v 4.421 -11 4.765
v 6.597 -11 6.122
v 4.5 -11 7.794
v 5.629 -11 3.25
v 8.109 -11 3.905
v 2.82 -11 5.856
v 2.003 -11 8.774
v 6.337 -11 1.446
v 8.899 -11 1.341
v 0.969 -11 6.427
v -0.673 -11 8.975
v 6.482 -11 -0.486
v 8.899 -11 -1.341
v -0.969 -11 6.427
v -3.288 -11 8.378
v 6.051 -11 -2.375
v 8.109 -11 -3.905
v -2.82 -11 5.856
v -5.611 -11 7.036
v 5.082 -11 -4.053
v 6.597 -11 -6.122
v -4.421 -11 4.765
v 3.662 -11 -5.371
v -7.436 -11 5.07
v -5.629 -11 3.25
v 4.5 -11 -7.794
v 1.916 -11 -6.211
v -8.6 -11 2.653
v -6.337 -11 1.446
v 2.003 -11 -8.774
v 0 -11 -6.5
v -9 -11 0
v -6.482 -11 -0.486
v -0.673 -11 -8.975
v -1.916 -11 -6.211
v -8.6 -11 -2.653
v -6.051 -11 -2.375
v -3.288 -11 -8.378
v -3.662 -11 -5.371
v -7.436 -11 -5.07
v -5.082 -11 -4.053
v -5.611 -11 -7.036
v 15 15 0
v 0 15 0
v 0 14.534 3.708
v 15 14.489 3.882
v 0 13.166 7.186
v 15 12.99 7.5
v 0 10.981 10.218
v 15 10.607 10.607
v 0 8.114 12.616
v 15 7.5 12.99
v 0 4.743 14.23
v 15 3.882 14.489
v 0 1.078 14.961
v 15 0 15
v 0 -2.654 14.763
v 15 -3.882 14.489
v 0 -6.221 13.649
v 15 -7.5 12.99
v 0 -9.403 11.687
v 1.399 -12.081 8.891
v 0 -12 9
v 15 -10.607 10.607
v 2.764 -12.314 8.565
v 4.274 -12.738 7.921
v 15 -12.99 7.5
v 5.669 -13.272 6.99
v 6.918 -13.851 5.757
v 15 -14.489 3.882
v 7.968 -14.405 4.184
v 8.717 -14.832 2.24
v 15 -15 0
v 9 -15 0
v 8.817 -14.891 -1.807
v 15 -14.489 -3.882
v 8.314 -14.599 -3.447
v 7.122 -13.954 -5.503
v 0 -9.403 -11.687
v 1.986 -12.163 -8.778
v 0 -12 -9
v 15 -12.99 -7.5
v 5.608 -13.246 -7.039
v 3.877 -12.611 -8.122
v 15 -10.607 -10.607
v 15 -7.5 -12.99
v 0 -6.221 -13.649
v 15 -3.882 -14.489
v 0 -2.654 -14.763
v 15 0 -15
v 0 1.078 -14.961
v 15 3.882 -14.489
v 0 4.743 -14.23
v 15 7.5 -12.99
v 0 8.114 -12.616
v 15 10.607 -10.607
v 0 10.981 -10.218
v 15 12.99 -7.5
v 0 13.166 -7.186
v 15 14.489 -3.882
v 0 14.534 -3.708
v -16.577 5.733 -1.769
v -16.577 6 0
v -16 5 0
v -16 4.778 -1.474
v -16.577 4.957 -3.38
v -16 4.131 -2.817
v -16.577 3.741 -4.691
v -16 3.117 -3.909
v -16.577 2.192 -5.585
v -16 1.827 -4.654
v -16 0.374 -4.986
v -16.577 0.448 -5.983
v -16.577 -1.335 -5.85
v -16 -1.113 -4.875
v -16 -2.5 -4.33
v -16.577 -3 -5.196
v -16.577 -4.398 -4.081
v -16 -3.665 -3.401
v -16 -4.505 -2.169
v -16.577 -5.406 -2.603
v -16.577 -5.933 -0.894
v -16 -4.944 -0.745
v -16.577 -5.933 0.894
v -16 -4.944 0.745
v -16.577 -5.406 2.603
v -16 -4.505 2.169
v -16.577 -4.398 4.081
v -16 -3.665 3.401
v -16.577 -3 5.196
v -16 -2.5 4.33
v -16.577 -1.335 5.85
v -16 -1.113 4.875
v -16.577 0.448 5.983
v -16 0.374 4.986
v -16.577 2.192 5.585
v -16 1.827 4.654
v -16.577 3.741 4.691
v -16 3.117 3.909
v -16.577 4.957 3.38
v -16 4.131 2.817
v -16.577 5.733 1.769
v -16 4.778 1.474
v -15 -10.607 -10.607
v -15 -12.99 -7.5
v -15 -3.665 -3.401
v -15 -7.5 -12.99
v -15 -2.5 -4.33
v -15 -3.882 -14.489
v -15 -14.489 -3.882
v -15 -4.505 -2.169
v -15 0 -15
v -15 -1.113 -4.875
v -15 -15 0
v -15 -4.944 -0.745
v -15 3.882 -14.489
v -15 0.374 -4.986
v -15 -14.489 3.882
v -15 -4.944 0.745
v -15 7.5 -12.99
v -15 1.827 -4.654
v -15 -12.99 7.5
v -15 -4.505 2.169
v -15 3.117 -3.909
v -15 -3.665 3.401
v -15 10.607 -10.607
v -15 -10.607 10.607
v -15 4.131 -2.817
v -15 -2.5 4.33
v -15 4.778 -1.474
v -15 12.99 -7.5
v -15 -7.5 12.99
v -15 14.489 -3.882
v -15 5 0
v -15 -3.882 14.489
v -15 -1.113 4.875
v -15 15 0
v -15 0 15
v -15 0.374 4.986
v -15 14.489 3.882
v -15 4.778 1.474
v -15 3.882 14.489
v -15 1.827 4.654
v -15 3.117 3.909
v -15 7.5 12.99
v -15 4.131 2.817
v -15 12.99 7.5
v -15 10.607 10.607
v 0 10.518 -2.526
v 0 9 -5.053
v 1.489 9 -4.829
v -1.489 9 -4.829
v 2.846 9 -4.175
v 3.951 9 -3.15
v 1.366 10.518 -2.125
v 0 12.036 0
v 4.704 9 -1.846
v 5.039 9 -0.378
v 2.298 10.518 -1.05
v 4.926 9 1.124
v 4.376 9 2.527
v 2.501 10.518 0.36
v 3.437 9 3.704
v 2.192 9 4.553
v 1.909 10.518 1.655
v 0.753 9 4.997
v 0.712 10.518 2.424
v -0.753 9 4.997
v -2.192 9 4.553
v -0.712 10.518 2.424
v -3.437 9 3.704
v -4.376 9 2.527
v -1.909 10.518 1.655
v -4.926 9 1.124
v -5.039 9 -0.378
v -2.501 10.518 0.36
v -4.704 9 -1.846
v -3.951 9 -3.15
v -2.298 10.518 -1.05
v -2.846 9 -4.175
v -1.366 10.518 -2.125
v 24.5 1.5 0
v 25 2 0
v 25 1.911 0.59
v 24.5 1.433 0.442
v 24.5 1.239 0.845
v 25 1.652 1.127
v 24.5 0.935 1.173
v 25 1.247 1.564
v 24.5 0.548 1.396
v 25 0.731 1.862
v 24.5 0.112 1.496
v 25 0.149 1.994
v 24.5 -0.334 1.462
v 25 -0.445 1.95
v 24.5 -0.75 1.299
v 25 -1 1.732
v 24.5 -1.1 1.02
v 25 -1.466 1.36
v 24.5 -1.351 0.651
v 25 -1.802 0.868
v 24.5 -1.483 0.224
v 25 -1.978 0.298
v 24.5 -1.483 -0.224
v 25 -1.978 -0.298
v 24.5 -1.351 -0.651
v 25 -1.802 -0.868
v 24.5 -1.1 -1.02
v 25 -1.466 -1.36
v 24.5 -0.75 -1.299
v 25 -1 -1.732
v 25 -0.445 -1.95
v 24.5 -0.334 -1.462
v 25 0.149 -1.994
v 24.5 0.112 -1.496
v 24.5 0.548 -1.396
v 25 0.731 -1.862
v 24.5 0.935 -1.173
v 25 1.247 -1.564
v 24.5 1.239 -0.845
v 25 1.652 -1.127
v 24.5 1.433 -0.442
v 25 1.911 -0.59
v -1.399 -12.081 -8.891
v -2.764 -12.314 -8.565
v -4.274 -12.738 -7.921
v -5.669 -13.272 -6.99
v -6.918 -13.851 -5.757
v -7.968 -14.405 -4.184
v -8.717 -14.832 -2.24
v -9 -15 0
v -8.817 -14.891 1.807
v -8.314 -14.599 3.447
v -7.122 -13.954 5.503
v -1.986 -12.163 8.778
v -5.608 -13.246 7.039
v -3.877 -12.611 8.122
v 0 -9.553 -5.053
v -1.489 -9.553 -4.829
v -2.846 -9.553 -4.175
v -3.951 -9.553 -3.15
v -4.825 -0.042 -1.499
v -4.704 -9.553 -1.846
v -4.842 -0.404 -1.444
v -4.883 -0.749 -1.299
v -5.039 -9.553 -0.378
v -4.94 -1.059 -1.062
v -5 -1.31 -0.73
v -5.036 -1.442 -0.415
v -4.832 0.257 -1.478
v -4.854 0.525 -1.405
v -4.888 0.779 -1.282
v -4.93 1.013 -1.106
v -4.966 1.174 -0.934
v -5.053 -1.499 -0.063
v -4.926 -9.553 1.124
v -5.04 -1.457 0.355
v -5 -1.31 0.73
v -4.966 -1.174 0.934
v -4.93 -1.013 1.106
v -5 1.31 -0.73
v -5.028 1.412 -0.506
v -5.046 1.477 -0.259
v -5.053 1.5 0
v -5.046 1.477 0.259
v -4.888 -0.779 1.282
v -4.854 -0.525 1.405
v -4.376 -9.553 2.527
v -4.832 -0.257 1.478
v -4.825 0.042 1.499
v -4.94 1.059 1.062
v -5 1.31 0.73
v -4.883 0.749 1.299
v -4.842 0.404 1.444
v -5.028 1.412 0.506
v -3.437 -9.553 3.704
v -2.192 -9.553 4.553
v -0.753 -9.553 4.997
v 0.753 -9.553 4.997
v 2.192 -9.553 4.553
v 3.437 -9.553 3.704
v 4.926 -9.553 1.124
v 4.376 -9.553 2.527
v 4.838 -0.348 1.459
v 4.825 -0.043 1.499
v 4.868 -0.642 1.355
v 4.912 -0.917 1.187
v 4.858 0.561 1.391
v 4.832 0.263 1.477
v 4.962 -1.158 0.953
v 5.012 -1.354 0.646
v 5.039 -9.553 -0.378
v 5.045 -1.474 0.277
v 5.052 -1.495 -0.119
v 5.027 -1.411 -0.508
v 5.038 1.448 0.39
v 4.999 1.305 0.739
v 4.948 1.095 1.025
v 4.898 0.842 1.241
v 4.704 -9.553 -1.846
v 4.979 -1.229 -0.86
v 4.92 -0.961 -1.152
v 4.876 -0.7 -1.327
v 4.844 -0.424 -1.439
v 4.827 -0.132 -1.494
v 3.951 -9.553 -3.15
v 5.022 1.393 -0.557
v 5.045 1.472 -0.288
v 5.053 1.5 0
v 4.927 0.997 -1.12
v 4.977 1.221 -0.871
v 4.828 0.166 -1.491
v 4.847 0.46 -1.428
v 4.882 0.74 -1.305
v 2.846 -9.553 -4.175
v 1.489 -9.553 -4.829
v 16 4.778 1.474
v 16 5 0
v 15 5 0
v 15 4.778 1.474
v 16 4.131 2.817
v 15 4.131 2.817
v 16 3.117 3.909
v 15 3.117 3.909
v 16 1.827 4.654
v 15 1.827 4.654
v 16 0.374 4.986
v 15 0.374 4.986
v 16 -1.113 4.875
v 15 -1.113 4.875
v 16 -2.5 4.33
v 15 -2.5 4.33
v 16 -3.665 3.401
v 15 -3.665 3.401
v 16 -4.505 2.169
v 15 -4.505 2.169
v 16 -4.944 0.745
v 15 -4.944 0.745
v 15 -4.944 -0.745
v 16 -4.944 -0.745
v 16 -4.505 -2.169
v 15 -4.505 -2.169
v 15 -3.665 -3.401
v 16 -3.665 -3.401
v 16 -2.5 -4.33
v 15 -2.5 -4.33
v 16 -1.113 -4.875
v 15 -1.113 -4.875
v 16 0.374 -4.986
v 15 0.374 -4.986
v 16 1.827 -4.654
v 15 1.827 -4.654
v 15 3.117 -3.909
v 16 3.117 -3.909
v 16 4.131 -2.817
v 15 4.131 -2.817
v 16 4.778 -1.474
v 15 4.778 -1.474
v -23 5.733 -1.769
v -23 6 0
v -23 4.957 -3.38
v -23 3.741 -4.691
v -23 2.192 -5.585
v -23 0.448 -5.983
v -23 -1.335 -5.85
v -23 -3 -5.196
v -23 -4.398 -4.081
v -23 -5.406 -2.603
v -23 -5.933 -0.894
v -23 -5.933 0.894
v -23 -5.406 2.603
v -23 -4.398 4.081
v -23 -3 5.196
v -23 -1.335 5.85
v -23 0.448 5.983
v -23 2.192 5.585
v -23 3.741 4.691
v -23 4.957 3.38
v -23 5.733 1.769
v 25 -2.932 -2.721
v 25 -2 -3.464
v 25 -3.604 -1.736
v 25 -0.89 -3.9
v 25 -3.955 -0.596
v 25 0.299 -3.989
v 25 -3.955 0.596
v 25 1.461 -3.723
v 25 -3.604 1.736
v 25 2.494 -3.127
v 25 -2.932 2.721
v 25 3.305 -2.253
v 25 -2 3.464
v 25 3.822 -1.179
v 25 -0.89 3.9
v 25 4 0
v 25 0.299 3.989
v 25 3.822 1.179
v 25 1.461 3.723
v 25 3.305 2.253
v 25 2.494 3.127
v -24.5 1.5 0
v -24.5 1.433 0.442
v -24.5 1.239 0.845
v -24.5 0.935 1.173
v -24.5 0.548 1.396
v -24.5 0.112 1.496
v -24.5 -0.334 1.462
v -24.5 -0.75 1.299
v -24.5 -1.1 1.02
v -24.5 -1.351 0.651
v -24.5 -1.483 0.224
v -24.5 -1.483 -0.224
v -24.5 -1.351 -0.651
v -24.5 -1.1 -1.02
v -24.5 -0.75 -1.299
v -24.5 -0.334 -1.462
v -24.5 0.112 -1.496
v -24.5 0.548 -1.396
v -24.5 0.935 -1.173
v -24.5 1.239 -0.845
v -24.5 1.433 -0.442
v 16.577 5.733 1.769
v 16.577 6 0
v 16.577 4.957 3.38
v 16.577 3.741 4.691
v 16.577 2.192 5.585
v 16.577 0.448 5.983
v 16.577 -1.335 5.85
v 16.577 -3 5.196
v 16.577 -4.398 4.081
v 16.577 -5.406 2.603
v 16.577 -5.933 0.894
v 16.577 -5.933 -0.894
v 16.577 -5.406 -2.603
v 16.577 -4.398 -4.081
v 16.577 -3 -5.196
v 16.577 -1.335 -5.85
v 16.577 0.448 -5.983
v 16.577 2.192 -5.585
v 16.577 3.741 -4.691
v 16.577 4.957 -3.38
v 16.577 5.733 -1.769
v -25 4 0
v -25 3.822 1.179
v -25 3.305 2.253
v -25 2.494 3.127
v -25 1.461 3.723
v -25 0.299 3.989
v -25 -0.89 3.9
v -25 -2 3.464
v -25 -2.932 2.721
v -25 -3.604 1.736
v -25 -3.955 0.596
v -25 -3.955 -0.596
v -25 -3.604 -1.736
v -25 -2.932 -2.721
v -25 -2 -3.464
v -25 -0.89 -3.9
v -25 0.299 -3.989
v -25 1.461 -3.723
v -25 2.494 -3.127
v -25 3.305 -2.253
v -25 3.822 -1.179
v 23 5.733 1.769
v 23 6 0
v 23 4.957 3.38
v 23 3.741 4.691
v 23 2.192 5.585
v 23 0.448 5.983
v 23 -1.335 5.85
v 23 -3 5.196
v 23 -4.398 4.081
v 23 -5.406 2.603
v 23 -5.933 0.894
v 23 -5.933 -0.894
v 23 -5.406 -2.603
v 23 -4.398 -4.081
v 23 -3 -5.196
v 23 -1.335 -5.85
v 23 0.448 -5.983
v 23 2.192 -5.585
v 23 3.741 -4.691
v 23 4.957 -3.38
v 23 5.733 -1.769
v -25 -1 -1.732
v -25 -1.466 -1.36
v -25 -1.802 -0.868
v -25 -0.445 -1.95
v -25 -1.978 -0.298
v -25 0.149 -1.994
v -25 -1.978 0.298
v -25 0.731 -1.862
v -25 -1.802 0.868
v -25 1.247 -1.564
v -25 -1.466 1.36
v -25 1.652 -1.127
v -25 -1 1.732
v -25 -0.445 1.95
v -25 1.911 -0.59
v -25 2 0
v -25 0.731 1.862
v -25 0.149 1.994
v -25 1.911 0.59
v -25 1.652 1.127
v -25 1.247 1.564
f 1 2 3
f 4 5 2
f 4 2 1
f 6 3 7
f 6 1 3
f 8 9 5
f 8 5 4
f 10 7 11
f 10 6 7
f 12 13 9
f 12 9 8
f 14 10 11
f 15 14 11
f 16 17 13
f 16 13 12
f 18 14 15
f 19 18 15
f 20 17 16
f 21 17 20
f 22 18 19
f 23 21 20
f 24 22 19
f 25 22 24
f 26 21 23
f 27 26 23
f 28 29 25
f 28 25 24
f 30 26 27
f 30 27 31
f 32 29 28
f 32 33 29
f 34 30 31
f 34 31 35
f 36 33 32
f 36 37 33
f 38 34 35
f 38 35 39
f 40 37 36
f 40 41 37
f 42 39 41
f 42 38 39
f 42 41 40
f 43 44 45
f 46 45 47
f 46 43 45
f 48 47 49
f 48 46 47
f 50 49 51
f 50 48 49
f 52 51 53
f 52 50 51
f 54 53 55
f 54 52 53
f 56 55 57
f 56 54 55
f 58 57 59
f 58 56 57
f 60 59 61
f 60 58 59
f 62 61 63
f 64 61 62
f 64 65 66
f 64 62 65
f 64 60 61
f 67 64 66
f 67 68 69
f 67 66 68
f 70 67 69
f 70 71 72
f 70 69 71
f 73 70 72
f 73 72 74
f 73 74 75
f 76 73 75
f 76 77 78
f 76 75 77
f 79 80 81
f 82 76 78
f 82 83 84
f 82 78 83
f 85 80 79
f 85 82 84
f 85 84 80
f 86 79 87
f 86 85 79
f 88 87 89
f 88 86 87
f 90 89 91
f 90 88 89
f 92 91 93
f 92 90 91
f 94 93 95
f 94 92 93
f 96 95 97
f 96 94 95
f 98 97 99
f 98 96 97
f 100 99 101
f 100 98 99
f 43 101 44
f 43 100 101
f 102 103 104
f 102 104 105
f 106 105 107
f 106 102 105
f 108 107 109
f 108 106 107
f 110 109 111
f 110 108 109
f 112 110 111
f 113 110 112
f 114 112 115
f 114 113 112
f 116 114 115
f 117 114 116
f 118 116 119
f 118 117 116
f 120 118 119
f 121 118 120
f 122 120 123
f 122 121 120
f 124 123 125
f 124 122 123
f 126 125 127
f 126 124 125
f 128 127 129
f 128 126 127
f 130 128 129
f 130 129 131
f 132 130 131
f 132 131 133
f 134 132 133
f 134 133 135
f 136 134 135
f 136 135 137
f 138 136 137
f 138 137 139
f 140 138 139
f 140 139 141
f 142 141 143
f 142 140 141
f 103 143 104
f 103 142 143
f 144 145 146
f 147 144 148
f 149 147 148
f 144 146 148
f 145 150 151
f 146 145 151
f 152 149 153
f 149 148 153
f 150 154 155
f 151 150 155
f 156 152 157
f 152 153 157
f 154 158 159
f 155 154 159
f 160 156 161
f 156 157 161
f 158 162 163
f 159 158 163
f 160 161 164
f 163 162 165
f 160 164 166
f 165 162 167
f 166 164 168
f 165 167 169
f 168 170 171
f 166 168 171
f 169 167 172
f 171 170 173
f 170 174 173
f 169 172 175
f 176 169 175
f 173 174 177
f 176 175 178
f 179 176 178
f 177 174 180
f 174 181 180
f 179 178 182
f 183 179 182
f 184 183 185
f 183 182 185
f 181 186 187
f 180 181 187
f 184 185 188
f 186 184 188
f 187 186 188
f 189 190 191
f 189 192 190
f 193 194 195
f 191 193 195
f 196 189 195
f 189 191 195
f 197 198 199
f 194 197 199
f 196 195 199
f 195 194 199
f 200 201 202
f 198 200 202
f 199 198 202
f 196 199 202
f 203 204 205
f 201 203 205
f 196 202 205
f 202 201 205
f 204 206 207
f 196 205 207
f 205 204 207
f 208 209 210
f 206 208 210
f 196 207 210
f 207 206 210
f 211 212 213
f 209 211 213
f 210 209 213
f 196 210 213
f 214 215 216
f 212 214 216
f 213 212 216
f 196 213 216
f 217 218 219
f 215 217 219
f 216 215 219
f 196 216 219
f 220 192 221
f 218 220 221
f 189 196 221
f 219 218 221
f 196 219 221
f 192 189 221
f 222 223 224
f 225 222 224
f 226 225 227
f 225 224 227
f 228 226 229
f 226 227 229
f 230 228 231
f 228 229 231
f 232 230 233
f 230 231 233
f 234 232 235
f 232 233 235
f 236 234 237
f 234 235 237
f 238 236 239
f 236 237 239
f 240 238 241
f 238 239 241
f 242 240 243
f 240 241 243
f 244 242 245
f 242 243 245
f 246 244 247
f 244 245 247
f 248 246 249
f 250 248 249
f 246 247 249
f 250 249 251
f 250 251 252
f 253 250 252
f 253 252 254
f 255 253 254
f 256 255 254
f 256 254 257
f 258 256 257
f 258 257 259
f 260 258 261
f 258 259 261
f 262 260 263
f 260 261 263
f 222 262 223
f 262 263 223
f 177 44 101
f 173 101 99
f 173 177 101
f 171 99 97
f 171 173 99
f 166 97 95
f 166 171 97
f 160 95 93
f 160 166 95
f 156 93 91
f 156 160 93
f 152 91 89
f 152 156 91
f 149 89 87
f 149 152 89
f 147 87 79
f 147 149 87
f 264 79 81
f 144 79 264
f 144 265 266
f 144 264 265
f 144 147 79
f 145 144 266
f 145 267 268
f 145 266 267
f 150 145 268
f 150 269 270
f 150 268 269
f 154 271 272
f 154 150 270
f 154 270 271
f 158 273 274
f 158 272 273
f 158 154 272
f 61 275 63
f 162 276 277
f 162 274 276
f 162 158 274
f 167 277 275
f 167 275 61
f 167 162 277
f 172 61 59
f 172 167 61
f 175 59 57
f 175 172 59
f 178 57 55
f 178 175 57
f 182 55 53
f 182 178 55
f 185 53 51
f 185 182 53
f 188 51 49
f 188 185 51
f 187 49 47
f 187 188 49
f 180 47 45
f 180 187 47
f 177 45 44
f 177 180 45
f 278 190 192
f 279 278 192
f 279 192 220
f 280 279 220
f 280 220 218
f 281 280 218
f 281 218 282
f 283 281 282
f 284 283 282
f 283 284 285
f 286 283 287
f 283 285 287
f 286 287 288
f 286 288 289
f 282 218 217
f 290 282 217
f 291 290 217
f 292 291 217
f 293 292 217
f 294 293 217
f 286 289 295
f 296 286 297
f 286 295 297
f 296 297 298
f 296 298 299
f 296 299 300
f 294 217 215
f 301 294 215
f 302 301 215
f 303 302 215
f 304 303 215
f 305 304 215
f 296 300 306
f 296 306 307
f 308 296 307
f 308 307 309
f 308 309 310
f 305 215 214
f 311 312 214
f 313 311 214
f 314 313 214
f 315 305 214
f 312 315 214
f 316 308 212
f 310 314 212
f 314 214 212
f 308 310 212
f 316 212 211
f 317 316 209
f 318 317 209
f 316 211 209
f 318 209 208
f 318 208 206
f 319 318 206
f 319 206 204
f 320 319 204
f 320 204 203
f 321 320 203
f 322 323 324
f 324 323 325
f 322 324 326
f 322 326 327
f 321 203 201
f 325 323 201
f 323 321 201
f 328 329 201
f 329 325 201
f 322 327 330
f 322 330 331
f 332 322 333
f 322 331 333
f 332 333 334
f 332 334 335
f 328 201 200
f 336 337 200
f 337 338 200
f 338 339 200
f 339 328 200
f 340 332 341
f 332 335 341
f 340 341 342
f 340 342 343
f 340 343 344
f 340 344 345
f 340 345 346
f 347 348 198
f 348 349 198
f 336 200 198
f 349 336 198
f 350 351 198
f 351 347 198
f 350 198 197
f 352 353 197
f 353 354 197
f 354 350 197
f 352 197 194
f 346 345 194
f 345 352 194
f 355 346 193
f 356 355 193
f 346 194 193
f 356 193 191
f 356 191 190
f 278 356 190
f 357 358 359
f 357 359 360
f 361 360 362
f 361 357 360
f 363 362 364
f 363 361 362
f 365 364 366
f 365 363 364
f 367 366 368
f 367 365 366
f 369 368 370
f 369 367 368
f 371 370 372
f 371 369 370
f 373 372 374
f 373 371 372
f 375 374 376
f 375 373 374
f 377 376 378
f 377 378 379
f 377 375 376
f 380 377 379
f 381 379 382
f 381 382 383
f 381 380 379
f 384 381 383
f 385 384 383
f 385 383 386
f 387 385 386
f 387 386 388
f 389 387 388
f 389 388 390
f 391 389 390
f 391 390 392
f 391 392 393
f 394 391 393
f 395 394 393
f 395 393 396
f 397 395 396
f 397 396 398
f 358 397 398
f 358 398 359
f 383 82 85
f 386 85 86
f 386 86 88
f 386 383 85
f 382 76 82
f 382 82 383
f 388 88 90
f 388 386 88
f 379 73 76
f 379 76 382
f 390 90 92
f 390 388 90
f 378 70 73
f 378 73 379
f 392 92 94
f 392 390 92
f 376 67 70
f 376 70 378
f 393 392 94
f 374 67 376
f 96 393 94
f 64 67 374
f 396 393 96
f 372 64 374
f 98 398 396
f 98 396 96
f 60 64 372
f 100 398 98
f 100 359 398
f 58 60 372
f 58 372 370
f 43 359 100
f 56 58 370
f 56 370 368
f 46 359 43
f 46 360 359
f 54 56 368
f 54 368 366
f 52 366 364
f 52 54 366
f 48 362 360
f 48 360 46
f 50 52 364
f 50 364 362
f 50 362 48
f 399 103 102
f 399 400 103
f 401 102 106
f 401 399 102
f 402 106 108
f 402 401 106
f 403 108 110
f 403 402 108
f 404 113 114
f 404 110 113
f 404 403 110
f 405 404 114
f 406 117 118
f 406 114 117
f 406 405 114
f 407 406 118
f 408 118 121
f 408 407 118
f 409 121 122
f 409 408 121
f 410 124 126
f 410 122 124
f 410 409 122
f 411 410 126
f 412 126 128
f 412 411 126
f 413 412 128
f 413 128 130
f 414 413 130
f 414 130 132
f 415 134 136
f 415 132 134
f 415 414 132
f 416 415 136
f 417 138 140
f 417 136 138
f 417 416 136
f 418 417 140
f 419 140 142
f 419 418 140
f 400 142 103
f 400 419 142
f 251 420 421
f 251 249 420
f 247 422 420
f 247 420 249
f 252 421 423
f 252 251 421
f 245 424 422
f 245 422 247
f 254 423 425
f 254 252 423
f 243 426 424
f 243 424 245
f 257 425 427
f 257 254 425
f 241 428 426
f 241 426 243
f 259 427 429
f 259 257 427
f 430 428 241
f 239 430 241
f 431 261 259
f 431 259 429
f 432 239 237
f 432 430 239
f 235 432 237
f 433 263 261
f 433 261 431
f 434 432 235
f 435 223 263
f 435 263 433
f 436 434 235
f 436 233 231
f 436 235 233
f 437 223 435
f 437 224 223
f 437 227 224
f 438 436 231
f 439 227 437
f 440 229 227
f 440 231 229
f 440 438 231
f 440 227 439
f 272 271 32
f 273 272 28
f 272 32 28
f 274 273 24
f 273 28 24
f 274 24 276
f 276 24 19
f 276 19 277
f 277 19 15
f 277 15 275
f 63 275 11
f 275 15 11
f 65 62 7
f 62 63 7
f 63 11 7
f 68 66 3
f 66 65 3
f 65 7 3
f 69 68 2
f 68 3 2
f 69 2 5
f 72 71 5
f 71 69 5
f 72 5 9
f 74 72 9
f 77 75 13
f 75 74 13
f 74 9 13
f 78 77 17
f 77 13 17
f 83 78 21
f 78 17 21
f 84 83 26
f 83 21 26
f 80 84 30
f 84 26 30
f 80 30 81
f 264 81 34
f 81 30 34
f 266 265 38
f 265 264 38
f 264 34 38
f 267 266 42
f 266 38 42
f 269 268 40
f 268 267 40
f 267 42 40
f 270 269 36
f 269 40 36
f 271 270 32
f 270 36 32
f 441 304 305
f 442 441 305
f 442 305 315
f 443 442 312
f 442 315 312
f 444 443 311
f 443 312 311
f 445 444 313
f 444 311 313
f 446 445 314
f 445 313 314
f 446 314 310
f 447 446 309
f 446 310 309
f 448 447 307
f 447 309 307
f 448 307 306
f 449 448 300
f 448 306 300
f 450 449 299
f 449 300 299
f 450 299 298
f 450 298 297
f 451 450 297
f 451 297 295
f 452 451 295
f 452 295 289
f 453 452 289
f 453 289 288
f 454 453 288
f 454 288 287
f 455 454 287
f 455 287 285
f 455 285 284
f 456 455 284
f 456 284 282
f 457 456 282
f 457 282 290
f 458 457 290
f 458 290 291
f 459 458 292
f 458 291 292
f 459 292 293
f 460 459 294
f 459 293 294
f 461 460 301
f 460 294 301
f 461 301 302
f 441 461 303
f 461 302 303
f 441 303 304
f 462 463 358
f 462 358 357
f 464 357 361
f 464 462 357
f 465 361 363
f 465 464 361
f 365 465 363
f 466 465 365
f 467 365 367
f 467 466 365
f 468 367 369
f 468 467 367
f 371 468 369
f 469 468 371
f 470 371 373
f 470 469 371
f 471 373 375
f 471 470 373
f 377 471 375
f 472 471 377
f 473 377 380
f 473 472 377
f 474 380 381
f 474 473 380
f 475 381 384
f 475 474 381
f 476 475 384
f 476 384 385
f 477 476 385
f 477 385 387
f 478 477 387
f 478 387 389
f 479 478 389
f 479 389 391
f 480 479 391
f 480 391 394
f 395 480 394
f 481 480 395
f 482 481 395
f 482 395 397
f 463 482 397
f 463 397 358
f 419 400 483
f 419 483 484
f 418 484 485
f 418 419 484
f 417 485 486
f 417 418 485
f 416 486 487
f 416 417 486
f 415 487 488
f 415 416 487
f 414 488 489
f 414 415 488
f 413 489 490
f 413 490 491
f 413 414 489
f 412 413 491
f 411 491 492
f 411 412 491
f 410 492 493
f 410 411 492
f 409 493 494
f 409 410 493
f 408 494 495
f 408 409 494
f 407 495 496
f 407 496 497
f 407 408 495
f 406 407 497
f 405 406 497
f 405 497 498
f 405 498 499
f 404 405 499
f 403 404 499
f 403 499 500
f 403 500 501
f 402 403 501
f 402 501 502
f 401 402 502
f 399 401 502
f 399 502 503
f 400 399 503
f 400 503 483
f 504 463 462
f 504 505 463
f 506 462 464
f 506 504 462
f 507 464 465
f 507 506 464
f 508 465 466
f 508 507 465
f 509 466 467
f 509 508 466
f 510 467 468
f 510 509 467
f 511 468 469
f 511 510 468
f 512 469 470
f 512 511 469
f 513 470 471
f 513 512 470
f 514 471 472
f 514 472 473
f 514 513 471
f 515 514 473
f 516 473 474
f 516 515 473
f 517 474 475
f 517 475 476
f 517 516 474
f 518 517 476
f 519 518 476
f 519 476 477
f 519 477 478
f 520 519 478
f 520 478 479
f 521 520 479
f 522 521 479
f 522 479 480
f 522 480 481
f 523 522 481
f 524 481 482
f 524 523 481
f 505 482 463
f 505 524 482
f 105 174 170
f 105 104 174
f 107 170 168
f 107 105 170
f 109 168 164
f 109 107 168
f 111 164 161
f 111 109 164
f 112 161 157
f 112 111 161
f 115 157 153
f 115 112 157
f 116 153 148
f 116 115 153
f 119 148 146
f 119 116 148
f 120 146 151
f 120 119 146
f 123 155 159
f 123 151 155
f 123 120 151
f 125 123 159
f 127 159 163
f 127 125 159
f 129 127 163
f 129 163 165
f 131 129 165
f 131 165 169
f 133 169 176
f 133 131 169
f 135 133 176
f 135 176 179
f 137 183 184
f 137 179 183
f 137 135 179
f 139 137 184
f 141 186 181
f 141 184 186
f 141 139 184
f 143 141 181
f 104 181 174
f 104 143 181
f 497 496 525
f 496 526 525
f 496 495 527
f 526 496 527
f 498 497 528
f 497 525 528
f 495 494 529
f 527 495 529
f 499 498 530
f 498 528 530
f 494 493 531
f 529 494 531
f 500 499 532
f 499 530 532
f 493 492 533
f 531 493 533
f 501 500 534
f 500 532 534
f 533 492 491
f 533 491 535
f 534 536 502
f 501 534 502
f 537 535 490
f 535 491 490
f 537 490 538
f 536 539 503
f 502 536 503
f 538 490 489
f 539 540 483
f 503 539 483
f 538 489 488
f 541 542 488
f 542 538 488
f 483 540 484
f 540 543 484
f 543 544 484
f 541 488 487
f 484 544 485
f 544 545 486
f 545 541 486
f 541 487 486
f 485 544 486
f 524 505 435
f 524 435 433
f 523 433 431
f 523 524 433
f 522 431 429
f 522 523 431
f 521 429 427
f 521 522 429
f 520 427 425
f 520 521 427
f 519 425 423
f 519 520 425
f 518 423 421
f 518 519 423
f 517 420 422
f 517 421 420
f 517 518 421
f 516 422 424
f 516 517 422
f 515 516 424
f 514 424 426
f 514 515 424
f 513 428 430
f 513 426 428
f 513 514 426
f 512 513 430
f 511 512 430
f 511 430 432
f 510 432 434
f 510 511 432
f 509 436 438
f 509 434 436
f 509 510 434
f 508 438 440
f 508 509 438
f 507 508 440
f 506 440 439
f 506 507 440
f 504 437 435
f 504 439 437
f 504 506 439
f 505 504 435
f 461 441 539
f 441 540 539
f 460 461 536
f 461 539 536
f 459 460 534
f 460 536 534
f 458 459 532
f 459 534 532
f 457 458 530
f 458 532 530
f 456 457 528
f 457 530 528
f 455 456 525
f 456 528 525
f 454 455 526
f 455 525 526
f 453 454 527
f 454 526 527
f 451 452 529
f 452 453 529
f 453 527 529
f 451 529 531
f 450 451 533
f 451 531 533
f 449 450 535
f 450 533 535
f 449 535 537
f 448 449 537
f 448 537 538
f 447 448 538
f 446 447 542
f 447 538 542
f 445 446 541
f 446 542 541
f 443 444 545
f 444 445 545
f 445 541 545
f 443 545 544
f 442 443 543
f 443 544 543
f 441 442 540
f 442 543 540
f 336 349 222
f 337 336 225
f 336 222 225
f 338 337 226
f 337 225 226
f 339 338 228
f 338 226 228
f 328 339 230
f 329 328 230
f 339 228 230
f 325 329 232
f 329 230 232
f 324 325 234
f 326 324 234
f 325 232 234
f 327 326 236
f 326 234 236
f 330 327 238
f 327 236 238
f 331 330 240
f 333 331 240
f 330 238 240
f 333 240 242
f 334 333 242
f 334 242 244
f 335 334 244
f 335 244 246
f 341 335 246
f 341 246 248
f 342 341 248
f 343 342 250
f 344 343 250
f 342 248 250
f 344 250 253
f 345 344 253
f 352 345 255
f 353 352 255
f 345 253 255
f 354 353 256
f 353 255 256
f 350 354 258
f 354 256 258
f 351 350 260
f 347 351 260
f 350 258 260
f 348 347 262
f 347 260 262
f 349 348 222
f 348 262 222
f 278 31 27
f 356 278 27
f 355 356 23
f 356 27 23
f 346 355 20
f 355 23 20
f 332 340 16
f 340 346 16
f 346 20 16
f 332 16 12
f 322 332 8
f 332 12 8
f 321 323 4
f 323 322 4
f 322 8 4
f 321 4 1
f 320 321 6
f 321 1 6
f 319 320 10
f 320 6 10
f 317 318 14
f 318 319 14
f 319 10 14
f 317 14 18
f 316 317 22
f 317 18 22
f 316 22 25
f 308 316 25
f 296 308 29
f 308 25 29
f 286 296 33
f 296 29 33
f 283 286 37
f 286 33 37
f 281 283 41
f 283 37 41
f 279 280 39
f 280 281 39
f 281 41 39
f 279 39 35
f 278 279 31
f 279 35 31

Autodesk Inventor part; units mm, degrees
ref_plane "YZ Plane" through (0, 0, 0) normal (1, 0, 0) x (0, 1, 0)
ref_plane "XZ Plane" through (0, 0, 0) normal (0, 1, 0) x (-1, 0, 0)
ref_plane "XY Plane" through (0, 0, 0) normal (0, 0, 1) x (1, 0, 0)
sketch "Sketch1" plane through (0, 0, 0) normal (0, 0, 1) x (1, 0, 0)
  line L0 (-35, 0) -> (35, 0) construction
  line L1 (0, -21) -> (0, 21) construction
  line L2 (0, 15) -> (-15, 15)
  line L3 (-15, 15) -> (-15, 5)
  line L4 (-15, 5) -> (-16, 5)
  line L5 (-16, 5) -> (-16.5774, 6)
  line L6 (-16.5774, 6) -> (-25, 6)
  line L7 (-25, 6) -> (-25, 0)
  line L8 (0, 15) -> (15, 15)
  line L9 (15, 15) -> (15, 5)
  line L10 (15, 5) -> (16, 5)
  line L11 (16, 5) -> (16.5774, 6)
  line L12 (16.5774, 6) -> (25, 6)
  line L13 (25, 6) -> (25, 0)
  line L14 (0, -15) -> (-15, -15)
  line L15 (-15, -15) -> (-15, -5)
  line L16 (-15, -5) -> (-16, -5)
  line L17 (-16, -5) -> (-16.5774, -6)
  line L18 (-16.5774, -6) -> (-25, -6)
  line L19 (-25, -6) -> (-25, 0)
  line L20 (15, -15) -> (15, -5)
  line L21 (15, -5) -> (16, -5)
  line L22 (16, -5) -> (16.5774, -6)
  line L23 (16.5774, -6) -> (25, -6)
  line L24 (25, -6) -> (25, 0)
  line L25 (0, -15) -> (15, -15)
  line L26 (-9, -15) -> (-9, -11)
  line L27 (-9, -11) -> (-5, -11)
  line L28 (-5, -11) -> (-5, 8)
  line L29 (-5, 8) -> (0, 11.0043)
  line L30 (0, 11.0043) -> (0, -15)
  line L31 (-25, 0) -> (25, 0)
  line L32 (-25, 1.5) -> (25, 1.5)
  point P0 (0, 0)
  dimension "d0" = 30
  dimension "d1" = 12
  dimension "d3" = 8.4227
  dimension "d5" = 60
  dimension "d6" = 10
  dimension "d7" = 30
  dimension "d8" = 50
  dimension "d9" = 59
  dimension "d10" = 10
  dimension "d11" = 4
  dimension "d12" = 18
  dimension "d13" = 23
  dimension "d23" = 3
  dimension "d27" = 10
  dimension "d29" = 1
revolve "Revolution1" add sketch "Sketch1" angle 360 about axis through (-25, 0, 0) along (1, 0, 0) contours L8 L9 L10 L11 L12 L13 L32 L30 L29 L28 L7 L6 L5 L4 L3 L2 | L28 L29 L30 L32
revolve "Revolution2" cut sketch "Sketch1" angle 360 about axis through (0, 11.0043, 0) along (0, -1, 0) contours L32 L30 L31 L28 | L28 L29 L30 L32 | L31 L30 L14 L26 L27 L28
thread "Thread2" size "M12x1.75" class "6g" standard "ISO Metric profile" full length
chamfer "Chamfer1" distance 2 angle 45 2 edges at (-25, -6, 0) (25, -6, 0)
chamfer "Chamfer2" distance 0.5 angle 45 2 edges at (-25, -1.5, 0) (25, -1.5, 0)
sketch "Sketch2" plane through (0, -11, 0) normal (0, -1, 0) x (0, 0, -1)
  circle A0 centre (0, 0) radius 5 projected
  point P0 (0, 0)
hole "Hole1" at (0, -11, 0) direction (0, 1, 0) diameter 10.106 depth 20 tip angle 118 countersink diameter 13 countersink angle 90 thread size "M12x1.75" class "6H" standard "ISO Metric profile"
properties part number "HM1-002" material "Steel, Alloy"
